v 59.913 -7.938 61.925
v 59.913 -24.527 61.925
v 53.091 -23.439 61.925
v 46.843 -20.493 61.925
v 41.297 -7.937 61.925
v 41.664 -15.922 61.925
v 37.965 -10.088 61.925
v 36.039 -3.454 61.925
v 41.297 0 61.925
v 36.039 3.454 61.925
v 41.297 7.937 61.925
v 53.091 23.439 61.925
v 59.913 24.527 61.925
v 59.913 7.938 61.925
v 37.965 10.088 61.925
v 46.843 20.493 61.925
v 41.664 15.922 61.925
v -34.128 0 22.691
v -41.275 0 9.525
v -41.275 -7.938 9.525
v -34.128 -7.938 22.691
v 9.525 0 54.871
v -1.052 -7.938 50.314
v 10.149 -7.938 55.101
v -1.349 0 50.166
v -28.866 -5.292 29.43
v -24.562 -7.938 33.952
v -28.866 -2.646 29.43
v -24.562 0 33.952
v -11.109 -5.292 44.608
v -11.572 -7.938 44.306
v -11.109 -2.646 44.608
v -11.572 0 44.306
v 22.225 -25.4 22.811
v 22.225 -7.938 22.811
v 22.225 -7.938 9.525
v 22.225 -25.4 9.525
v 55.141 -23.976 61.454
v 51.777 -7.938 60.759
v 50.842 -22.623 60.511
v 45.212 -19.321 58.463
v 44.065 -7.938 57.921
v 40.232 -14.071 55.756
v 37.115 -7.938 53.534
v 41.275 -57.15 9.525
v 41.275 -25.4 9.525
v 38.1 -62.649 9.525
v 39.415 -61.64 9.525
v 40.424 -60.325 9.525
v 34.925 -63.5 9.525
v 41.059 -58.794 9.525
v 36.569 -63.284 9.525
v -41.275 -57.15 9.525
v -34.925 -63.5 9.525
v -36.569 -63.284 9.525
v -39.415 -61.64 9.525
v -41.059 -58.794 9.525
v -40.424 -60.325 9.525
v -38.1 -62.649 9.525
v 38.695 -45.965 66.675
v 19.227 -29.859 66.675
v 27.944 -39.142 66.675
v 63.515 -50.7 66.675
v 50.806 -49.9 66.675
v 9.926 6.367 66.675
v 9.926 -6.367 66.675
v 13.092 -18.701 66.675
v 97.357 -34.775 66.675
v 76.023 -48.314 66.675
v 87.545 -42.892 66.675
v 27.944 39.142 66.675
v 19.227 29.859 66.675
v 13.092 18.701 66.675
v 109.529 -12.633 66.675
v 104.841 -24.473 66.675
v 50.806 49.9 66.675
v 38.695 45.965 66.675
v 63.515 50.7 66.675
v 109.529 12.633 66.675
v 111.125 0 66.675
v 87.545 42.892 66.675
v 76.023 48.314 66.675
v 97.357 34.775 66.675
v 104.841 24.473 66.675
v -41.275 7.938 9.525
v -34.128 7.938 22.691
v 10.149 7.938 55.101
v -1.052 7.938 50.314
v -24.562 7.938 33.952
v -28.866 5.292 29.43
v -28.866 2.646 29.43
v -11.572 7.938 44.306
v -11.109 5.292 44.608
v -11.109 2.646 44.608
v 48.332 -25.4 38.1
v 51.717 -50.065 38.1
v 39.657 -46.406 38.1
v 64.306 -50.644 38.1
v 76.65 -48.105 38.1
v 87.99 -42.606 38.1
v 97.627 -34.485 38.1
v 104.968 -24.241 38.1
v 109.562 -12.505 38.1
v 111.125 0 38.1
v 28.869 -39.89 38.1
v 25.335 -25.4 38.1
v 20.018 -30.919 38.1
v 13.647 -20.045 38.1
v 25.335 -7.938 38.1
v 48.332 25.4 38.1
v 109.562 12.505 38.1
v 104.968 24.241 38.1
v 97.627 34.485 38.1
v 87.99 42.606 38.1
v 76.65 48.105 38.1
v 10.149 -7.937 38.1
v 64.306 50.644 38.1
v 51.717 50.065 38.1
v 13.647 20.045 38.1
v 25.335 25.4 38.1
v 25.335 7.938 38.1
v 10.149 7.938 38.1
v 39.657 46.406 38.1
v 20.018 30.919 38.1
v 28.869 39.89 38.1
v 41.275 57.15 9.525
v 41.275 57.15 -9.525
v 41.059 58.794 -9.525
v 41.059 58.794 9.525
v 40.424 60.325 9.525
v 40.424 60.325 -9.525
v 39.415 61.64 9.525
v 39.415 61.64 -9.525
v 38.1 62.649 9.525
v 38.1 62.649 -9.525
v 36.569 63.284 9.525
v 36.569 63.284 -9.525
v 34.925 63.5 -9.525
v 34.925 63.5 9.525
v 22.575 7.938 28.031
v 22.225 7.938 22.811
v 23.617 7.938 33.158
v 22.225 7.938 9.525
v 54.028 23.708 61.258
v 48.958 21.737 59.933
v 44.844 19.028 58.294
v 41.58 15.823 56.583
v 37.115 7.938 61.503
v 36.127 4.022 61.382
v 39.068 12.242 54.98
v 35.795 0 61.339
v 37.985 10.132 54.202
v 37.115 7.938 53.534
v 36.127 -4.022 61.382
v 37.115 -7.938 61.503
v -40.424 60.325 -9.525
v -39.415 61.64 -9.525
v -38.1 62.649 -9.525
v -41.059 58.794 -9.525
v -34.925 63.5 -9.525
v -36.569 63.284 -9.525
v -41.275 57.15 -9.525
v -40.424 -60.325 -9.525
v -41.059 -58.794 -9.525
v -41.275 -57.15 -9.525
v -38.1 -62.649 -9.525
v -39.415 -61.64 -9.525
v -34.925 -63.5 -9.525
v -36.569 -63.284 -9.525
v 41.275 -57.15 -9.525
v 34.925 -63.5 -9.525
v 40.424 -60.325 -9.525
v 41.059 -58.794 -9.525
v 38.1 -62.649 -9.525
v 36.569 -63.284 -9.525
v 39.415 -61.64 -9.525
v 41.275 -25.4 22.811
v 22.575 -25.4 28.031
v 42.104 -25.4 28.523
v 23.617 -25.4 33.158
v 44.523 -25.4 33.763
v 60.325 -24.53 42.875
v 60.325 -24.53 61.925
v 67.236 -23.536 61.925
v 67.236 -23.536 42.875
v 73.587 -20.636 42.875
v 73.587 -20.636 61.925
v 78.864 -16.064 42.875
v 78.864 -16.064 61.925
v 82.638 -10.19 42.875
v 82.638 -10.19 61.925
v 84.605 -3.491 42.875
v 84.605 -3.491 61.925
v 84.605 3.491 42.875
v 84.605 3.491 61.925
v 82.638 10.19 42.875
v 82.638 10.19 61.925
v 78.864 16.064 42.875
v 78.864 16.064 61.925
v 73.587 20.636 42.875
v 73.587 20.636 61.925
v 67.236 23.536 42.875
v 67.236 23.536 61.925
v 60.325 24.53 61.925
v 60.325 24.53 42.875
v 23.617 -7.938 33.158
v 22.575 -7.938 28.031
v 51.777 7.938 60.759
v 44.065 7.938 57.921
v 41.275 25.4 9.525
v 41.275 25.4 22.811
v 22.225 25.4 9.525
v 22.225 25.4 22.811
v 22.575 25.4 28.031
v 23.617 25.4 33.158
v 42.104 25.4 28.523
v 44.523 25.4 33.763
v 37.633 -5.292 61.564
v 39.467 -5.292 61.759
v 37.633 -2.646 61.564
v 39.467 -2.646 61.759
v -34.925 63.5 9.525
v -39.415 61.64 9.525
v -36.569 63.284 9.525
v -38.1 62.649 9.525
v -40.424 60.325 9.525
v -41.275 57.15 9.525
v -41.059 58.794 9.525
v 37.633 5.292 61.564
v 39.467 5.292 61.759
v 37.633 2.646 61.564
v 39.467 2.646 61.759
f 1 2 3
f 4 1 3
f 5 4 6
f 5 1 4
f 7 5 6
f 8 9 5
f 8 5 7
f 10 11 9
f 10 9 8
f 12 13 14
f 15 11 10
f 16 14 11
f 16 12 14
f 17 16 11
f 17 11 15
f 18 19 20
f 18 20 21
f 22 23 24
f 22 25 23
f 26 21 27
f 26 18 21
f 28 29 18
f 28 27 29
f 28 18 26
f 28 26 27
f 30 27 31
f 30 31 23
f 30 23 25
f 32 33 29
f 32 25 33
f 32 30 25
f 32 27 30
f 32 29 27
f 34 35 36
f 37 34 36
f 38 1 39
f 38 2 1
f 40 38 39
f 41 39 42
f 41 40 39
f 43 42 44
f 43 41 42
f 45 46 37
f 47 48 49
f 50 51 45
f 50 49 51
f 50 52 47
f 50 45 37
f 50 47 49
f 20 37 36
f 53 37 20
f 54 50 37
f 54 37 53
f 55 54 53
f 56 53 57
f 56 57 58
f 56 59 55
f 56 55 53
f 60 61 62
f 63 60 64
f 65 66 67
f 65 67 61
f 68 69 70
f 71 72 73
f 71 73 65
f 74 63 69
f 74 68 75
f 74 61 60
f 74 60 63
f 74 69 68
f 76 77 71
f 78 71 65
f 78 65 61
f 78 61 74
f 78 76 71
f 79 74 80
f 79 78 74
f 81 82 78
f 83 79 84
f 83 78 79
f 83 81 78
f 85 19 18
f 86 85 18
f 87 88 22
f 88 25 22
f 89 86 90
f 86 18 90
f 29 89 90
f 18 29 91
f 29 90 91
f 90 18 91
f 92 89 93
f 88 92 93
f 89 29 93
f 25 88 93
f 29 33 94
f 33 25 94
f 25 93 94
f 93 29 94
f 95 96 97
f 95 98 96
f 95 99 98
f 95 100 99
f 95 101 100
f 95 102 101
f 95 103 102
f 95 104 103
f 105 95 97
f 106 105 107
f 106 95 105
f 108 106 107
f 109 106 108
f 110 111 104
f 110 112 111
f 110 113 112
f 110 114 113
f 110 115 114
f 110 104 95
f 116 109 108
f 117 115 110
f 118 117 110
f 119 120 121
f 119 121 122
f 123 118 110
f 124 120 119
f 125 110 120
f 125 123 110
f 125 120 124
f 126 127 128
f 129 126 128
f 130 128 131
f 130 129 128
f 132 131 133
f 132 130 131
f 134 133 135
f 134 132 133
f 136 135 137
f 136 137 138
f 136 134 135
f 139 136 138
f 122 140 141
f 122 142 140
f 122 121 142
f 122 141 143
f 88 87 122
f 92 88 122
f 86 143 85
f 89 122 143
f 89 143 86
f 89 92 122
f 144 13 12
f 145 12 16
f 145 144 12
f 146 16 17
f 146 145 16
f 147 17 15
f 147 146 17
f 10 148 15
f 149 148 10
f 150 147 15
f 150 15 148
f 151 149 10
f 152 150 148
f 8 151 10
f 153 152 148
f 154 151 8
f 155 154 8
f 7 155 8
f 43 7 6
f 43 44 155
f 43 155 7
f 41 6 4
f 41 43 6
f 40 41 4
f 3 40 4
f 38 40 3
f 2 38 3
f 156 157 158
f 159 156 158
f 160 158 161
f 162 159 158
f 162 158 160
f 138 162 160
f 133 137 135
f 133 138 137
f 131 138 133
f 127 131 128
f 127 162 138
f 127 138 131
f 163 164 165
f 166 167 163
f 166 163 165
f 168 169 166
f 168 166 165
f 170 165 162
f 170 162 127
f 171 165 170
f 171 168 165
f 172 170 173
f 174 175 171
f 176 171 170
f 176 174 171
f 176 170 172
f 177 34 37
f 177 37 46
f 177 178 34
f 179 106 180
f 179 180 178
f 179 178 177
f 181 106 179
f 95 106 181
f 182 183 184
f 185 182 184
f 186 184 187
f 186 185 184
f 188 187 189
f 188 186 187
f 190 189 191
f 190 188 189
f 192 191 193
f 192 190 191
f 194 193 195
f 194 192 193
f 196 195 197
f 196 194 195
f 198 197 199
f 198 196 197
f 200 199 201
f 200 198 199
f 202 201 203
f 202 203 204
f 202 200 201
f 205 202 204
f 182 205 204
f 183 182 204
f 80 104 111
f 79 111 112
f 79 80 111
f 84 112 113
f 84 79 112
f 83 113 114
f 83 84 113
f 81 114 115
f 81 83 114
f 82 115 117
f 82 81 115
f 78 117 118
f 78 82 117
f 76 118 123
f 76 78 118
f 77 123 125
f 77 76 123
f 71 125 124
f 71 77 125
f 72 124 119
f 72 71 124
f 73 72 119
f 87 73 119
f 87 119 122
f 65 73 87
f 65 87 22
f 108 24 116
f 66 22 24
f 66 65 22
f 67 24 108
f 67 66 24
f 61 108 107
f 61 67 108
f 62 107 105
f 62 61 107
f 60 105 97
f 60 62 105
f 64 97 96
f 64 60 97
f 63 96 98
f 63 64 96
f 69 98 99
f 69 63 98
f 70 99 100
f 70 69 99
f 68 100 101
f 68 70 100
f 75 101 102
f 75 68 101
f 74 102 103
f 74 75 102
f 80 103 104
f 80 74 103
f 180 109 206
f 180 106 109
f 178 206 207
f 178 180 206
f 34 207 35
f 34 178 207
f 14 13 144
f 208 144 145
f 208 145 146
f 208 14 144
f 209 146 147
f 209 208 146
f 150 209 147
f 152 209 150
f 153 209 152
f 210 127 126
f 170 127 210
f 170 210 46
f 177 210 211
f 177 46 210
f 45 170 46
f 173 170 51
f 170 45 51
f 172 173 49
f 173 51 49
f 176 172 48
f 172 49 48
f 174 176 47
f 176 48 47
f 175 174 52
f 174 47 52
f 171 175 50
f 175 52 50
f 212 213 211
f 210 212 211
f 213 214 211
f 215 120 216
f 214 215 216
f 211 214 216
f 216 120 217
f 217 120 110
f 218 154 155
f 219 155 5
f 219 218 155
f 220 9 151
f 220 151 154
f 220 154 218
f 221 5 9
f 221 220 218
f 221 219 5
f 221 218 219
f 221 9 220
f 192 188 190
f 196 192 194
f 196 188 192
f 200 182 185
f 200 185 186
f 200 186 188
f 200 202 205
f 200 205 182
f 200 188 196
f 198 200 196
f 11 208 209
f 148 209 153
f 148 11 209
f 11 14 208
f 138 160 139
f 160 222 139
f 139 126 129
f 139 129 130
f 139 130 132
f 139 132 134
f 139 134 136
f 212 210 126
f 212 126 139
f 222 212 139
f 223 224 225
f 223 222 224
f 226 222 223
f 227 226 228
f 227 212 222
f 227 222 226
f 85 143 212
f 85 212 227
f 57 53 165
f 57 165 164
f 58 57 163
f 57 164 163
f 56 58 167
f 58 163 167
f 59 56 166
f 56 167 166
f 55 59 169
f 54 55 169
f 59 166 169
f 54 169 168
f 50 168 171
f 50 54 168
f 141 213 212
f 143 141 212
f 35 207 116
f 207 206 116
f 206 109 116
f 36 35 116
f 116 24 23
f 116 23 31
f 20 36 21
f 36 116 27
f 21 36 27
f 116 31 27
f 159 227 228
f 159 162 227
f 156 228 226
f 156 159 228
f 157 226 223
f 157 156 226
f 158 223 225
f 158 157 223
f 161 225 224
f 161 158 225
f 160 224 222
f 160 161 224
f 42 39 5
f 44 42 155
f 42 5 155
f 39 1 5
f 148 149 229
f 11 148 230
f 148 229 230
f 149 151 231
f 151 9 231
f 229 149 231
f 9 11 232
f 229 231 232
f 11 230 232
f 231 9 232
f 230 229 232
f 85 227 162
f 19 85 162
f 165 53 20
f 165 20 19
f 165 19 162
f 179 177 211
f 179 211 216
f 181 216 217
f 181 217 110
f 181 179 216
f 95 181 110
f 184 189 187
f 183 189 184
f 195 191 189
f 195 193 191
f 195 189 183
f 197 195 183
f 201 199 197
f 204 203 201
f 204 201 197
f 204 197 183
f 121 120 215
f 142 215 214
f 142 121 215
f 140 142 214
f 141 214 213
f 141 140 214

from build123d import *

# Parameters (mm, degrees)
F1_DEPTH = 63.5
F2_DEPTH = 25.4
F3_DEPTH = 7.9375
F5_R     = 6.35


with BuildPart() as f1:
    # F0 (on Front) → F1 (new body, symmetric)
    with BuildSketch(Plane.XZ):
        Polygon((-41.275, -9.525), (41.275, -9.525), (41.275, 9.525), (22.225, 9.525), (-41.275, 9.525), align=None)
    extrude(amount=F1_DEPTH, both=True)

    # F0 (on Front) → F2 (join, symmetric)
    with BuildSketch(Plane.XZ):
        with BuildLine():
            Line((22.225, 9.525), (41.275, 9.525))
            Line((41.275, 9.525), (41.275, 22.81095))
            ThreePointArc((41.275, 22.81095), (46.796103, 36.644574), (60.325, 42.8752))
            Line((60.325, 42.8752), (60.325, 61.9252))
            Line((60.325, 61.9252), (59.912667, 61.9252))
            ThreePointArc((59.912667, 61.9252), (33.179972, 49.969212), (22.225, 22.81095))
            Line((22.225, 22.81095), (22.225, 9.525))
        make_face()
    extrude(amount=F2_DEPTH, both=True)

    # F0 (on Front) → F3 (join, symmetric)
    with BuildSketch(Plane.XZ):
        with BuildLine():
            add(Edge.make_bspline(
                [(-41.275, 9.525), (-25.498318, 48.070595), (22.572279, 65.208808), (59.912667, 61.9252)],
                knots=[0, 0, 0, 0, 113.950537, 113.950537, 113.950537, 113.950537], degree=3))
            Line((-41.275, 9.525), (22.225, 9.525))
            Line((22.225, 9.525), (22.225, 22.81095))
            ThreePointArc((22.225, 22.81095), (33.179972, 49.969212), (59.912667, 61.9252))
        make_face()
    extrude(amount=F3_DEPTH, both=True)

    # F0 (on Front) → F4 (revolve)
    with BuildSketch(Plane.XZ):
        Polygon((84.855057, 42.8752), (60.325, 42.8752), (60.325, 38.1), (111.125, 38.1), (111.125, 66.675), (60.325, 66.675), (60.325, 61.9252), (84.855057, 61.9252), align=None)
    revolve(axis=Axis((60.325, 0, 52.3875), (0, 0, 1)))

    # F5
    f5_edges = [f1.edges().sort_by_distance(p)[0] for p in [
        (-41.275, -63.5, 0),
        (41.275, -63.5, 0),
        (-41.275, 63.5, 0),
        (41.275, 63.5, 0),
    ]]
    fillet(f5_edges, radius=F5_R)


solid = f1.part
